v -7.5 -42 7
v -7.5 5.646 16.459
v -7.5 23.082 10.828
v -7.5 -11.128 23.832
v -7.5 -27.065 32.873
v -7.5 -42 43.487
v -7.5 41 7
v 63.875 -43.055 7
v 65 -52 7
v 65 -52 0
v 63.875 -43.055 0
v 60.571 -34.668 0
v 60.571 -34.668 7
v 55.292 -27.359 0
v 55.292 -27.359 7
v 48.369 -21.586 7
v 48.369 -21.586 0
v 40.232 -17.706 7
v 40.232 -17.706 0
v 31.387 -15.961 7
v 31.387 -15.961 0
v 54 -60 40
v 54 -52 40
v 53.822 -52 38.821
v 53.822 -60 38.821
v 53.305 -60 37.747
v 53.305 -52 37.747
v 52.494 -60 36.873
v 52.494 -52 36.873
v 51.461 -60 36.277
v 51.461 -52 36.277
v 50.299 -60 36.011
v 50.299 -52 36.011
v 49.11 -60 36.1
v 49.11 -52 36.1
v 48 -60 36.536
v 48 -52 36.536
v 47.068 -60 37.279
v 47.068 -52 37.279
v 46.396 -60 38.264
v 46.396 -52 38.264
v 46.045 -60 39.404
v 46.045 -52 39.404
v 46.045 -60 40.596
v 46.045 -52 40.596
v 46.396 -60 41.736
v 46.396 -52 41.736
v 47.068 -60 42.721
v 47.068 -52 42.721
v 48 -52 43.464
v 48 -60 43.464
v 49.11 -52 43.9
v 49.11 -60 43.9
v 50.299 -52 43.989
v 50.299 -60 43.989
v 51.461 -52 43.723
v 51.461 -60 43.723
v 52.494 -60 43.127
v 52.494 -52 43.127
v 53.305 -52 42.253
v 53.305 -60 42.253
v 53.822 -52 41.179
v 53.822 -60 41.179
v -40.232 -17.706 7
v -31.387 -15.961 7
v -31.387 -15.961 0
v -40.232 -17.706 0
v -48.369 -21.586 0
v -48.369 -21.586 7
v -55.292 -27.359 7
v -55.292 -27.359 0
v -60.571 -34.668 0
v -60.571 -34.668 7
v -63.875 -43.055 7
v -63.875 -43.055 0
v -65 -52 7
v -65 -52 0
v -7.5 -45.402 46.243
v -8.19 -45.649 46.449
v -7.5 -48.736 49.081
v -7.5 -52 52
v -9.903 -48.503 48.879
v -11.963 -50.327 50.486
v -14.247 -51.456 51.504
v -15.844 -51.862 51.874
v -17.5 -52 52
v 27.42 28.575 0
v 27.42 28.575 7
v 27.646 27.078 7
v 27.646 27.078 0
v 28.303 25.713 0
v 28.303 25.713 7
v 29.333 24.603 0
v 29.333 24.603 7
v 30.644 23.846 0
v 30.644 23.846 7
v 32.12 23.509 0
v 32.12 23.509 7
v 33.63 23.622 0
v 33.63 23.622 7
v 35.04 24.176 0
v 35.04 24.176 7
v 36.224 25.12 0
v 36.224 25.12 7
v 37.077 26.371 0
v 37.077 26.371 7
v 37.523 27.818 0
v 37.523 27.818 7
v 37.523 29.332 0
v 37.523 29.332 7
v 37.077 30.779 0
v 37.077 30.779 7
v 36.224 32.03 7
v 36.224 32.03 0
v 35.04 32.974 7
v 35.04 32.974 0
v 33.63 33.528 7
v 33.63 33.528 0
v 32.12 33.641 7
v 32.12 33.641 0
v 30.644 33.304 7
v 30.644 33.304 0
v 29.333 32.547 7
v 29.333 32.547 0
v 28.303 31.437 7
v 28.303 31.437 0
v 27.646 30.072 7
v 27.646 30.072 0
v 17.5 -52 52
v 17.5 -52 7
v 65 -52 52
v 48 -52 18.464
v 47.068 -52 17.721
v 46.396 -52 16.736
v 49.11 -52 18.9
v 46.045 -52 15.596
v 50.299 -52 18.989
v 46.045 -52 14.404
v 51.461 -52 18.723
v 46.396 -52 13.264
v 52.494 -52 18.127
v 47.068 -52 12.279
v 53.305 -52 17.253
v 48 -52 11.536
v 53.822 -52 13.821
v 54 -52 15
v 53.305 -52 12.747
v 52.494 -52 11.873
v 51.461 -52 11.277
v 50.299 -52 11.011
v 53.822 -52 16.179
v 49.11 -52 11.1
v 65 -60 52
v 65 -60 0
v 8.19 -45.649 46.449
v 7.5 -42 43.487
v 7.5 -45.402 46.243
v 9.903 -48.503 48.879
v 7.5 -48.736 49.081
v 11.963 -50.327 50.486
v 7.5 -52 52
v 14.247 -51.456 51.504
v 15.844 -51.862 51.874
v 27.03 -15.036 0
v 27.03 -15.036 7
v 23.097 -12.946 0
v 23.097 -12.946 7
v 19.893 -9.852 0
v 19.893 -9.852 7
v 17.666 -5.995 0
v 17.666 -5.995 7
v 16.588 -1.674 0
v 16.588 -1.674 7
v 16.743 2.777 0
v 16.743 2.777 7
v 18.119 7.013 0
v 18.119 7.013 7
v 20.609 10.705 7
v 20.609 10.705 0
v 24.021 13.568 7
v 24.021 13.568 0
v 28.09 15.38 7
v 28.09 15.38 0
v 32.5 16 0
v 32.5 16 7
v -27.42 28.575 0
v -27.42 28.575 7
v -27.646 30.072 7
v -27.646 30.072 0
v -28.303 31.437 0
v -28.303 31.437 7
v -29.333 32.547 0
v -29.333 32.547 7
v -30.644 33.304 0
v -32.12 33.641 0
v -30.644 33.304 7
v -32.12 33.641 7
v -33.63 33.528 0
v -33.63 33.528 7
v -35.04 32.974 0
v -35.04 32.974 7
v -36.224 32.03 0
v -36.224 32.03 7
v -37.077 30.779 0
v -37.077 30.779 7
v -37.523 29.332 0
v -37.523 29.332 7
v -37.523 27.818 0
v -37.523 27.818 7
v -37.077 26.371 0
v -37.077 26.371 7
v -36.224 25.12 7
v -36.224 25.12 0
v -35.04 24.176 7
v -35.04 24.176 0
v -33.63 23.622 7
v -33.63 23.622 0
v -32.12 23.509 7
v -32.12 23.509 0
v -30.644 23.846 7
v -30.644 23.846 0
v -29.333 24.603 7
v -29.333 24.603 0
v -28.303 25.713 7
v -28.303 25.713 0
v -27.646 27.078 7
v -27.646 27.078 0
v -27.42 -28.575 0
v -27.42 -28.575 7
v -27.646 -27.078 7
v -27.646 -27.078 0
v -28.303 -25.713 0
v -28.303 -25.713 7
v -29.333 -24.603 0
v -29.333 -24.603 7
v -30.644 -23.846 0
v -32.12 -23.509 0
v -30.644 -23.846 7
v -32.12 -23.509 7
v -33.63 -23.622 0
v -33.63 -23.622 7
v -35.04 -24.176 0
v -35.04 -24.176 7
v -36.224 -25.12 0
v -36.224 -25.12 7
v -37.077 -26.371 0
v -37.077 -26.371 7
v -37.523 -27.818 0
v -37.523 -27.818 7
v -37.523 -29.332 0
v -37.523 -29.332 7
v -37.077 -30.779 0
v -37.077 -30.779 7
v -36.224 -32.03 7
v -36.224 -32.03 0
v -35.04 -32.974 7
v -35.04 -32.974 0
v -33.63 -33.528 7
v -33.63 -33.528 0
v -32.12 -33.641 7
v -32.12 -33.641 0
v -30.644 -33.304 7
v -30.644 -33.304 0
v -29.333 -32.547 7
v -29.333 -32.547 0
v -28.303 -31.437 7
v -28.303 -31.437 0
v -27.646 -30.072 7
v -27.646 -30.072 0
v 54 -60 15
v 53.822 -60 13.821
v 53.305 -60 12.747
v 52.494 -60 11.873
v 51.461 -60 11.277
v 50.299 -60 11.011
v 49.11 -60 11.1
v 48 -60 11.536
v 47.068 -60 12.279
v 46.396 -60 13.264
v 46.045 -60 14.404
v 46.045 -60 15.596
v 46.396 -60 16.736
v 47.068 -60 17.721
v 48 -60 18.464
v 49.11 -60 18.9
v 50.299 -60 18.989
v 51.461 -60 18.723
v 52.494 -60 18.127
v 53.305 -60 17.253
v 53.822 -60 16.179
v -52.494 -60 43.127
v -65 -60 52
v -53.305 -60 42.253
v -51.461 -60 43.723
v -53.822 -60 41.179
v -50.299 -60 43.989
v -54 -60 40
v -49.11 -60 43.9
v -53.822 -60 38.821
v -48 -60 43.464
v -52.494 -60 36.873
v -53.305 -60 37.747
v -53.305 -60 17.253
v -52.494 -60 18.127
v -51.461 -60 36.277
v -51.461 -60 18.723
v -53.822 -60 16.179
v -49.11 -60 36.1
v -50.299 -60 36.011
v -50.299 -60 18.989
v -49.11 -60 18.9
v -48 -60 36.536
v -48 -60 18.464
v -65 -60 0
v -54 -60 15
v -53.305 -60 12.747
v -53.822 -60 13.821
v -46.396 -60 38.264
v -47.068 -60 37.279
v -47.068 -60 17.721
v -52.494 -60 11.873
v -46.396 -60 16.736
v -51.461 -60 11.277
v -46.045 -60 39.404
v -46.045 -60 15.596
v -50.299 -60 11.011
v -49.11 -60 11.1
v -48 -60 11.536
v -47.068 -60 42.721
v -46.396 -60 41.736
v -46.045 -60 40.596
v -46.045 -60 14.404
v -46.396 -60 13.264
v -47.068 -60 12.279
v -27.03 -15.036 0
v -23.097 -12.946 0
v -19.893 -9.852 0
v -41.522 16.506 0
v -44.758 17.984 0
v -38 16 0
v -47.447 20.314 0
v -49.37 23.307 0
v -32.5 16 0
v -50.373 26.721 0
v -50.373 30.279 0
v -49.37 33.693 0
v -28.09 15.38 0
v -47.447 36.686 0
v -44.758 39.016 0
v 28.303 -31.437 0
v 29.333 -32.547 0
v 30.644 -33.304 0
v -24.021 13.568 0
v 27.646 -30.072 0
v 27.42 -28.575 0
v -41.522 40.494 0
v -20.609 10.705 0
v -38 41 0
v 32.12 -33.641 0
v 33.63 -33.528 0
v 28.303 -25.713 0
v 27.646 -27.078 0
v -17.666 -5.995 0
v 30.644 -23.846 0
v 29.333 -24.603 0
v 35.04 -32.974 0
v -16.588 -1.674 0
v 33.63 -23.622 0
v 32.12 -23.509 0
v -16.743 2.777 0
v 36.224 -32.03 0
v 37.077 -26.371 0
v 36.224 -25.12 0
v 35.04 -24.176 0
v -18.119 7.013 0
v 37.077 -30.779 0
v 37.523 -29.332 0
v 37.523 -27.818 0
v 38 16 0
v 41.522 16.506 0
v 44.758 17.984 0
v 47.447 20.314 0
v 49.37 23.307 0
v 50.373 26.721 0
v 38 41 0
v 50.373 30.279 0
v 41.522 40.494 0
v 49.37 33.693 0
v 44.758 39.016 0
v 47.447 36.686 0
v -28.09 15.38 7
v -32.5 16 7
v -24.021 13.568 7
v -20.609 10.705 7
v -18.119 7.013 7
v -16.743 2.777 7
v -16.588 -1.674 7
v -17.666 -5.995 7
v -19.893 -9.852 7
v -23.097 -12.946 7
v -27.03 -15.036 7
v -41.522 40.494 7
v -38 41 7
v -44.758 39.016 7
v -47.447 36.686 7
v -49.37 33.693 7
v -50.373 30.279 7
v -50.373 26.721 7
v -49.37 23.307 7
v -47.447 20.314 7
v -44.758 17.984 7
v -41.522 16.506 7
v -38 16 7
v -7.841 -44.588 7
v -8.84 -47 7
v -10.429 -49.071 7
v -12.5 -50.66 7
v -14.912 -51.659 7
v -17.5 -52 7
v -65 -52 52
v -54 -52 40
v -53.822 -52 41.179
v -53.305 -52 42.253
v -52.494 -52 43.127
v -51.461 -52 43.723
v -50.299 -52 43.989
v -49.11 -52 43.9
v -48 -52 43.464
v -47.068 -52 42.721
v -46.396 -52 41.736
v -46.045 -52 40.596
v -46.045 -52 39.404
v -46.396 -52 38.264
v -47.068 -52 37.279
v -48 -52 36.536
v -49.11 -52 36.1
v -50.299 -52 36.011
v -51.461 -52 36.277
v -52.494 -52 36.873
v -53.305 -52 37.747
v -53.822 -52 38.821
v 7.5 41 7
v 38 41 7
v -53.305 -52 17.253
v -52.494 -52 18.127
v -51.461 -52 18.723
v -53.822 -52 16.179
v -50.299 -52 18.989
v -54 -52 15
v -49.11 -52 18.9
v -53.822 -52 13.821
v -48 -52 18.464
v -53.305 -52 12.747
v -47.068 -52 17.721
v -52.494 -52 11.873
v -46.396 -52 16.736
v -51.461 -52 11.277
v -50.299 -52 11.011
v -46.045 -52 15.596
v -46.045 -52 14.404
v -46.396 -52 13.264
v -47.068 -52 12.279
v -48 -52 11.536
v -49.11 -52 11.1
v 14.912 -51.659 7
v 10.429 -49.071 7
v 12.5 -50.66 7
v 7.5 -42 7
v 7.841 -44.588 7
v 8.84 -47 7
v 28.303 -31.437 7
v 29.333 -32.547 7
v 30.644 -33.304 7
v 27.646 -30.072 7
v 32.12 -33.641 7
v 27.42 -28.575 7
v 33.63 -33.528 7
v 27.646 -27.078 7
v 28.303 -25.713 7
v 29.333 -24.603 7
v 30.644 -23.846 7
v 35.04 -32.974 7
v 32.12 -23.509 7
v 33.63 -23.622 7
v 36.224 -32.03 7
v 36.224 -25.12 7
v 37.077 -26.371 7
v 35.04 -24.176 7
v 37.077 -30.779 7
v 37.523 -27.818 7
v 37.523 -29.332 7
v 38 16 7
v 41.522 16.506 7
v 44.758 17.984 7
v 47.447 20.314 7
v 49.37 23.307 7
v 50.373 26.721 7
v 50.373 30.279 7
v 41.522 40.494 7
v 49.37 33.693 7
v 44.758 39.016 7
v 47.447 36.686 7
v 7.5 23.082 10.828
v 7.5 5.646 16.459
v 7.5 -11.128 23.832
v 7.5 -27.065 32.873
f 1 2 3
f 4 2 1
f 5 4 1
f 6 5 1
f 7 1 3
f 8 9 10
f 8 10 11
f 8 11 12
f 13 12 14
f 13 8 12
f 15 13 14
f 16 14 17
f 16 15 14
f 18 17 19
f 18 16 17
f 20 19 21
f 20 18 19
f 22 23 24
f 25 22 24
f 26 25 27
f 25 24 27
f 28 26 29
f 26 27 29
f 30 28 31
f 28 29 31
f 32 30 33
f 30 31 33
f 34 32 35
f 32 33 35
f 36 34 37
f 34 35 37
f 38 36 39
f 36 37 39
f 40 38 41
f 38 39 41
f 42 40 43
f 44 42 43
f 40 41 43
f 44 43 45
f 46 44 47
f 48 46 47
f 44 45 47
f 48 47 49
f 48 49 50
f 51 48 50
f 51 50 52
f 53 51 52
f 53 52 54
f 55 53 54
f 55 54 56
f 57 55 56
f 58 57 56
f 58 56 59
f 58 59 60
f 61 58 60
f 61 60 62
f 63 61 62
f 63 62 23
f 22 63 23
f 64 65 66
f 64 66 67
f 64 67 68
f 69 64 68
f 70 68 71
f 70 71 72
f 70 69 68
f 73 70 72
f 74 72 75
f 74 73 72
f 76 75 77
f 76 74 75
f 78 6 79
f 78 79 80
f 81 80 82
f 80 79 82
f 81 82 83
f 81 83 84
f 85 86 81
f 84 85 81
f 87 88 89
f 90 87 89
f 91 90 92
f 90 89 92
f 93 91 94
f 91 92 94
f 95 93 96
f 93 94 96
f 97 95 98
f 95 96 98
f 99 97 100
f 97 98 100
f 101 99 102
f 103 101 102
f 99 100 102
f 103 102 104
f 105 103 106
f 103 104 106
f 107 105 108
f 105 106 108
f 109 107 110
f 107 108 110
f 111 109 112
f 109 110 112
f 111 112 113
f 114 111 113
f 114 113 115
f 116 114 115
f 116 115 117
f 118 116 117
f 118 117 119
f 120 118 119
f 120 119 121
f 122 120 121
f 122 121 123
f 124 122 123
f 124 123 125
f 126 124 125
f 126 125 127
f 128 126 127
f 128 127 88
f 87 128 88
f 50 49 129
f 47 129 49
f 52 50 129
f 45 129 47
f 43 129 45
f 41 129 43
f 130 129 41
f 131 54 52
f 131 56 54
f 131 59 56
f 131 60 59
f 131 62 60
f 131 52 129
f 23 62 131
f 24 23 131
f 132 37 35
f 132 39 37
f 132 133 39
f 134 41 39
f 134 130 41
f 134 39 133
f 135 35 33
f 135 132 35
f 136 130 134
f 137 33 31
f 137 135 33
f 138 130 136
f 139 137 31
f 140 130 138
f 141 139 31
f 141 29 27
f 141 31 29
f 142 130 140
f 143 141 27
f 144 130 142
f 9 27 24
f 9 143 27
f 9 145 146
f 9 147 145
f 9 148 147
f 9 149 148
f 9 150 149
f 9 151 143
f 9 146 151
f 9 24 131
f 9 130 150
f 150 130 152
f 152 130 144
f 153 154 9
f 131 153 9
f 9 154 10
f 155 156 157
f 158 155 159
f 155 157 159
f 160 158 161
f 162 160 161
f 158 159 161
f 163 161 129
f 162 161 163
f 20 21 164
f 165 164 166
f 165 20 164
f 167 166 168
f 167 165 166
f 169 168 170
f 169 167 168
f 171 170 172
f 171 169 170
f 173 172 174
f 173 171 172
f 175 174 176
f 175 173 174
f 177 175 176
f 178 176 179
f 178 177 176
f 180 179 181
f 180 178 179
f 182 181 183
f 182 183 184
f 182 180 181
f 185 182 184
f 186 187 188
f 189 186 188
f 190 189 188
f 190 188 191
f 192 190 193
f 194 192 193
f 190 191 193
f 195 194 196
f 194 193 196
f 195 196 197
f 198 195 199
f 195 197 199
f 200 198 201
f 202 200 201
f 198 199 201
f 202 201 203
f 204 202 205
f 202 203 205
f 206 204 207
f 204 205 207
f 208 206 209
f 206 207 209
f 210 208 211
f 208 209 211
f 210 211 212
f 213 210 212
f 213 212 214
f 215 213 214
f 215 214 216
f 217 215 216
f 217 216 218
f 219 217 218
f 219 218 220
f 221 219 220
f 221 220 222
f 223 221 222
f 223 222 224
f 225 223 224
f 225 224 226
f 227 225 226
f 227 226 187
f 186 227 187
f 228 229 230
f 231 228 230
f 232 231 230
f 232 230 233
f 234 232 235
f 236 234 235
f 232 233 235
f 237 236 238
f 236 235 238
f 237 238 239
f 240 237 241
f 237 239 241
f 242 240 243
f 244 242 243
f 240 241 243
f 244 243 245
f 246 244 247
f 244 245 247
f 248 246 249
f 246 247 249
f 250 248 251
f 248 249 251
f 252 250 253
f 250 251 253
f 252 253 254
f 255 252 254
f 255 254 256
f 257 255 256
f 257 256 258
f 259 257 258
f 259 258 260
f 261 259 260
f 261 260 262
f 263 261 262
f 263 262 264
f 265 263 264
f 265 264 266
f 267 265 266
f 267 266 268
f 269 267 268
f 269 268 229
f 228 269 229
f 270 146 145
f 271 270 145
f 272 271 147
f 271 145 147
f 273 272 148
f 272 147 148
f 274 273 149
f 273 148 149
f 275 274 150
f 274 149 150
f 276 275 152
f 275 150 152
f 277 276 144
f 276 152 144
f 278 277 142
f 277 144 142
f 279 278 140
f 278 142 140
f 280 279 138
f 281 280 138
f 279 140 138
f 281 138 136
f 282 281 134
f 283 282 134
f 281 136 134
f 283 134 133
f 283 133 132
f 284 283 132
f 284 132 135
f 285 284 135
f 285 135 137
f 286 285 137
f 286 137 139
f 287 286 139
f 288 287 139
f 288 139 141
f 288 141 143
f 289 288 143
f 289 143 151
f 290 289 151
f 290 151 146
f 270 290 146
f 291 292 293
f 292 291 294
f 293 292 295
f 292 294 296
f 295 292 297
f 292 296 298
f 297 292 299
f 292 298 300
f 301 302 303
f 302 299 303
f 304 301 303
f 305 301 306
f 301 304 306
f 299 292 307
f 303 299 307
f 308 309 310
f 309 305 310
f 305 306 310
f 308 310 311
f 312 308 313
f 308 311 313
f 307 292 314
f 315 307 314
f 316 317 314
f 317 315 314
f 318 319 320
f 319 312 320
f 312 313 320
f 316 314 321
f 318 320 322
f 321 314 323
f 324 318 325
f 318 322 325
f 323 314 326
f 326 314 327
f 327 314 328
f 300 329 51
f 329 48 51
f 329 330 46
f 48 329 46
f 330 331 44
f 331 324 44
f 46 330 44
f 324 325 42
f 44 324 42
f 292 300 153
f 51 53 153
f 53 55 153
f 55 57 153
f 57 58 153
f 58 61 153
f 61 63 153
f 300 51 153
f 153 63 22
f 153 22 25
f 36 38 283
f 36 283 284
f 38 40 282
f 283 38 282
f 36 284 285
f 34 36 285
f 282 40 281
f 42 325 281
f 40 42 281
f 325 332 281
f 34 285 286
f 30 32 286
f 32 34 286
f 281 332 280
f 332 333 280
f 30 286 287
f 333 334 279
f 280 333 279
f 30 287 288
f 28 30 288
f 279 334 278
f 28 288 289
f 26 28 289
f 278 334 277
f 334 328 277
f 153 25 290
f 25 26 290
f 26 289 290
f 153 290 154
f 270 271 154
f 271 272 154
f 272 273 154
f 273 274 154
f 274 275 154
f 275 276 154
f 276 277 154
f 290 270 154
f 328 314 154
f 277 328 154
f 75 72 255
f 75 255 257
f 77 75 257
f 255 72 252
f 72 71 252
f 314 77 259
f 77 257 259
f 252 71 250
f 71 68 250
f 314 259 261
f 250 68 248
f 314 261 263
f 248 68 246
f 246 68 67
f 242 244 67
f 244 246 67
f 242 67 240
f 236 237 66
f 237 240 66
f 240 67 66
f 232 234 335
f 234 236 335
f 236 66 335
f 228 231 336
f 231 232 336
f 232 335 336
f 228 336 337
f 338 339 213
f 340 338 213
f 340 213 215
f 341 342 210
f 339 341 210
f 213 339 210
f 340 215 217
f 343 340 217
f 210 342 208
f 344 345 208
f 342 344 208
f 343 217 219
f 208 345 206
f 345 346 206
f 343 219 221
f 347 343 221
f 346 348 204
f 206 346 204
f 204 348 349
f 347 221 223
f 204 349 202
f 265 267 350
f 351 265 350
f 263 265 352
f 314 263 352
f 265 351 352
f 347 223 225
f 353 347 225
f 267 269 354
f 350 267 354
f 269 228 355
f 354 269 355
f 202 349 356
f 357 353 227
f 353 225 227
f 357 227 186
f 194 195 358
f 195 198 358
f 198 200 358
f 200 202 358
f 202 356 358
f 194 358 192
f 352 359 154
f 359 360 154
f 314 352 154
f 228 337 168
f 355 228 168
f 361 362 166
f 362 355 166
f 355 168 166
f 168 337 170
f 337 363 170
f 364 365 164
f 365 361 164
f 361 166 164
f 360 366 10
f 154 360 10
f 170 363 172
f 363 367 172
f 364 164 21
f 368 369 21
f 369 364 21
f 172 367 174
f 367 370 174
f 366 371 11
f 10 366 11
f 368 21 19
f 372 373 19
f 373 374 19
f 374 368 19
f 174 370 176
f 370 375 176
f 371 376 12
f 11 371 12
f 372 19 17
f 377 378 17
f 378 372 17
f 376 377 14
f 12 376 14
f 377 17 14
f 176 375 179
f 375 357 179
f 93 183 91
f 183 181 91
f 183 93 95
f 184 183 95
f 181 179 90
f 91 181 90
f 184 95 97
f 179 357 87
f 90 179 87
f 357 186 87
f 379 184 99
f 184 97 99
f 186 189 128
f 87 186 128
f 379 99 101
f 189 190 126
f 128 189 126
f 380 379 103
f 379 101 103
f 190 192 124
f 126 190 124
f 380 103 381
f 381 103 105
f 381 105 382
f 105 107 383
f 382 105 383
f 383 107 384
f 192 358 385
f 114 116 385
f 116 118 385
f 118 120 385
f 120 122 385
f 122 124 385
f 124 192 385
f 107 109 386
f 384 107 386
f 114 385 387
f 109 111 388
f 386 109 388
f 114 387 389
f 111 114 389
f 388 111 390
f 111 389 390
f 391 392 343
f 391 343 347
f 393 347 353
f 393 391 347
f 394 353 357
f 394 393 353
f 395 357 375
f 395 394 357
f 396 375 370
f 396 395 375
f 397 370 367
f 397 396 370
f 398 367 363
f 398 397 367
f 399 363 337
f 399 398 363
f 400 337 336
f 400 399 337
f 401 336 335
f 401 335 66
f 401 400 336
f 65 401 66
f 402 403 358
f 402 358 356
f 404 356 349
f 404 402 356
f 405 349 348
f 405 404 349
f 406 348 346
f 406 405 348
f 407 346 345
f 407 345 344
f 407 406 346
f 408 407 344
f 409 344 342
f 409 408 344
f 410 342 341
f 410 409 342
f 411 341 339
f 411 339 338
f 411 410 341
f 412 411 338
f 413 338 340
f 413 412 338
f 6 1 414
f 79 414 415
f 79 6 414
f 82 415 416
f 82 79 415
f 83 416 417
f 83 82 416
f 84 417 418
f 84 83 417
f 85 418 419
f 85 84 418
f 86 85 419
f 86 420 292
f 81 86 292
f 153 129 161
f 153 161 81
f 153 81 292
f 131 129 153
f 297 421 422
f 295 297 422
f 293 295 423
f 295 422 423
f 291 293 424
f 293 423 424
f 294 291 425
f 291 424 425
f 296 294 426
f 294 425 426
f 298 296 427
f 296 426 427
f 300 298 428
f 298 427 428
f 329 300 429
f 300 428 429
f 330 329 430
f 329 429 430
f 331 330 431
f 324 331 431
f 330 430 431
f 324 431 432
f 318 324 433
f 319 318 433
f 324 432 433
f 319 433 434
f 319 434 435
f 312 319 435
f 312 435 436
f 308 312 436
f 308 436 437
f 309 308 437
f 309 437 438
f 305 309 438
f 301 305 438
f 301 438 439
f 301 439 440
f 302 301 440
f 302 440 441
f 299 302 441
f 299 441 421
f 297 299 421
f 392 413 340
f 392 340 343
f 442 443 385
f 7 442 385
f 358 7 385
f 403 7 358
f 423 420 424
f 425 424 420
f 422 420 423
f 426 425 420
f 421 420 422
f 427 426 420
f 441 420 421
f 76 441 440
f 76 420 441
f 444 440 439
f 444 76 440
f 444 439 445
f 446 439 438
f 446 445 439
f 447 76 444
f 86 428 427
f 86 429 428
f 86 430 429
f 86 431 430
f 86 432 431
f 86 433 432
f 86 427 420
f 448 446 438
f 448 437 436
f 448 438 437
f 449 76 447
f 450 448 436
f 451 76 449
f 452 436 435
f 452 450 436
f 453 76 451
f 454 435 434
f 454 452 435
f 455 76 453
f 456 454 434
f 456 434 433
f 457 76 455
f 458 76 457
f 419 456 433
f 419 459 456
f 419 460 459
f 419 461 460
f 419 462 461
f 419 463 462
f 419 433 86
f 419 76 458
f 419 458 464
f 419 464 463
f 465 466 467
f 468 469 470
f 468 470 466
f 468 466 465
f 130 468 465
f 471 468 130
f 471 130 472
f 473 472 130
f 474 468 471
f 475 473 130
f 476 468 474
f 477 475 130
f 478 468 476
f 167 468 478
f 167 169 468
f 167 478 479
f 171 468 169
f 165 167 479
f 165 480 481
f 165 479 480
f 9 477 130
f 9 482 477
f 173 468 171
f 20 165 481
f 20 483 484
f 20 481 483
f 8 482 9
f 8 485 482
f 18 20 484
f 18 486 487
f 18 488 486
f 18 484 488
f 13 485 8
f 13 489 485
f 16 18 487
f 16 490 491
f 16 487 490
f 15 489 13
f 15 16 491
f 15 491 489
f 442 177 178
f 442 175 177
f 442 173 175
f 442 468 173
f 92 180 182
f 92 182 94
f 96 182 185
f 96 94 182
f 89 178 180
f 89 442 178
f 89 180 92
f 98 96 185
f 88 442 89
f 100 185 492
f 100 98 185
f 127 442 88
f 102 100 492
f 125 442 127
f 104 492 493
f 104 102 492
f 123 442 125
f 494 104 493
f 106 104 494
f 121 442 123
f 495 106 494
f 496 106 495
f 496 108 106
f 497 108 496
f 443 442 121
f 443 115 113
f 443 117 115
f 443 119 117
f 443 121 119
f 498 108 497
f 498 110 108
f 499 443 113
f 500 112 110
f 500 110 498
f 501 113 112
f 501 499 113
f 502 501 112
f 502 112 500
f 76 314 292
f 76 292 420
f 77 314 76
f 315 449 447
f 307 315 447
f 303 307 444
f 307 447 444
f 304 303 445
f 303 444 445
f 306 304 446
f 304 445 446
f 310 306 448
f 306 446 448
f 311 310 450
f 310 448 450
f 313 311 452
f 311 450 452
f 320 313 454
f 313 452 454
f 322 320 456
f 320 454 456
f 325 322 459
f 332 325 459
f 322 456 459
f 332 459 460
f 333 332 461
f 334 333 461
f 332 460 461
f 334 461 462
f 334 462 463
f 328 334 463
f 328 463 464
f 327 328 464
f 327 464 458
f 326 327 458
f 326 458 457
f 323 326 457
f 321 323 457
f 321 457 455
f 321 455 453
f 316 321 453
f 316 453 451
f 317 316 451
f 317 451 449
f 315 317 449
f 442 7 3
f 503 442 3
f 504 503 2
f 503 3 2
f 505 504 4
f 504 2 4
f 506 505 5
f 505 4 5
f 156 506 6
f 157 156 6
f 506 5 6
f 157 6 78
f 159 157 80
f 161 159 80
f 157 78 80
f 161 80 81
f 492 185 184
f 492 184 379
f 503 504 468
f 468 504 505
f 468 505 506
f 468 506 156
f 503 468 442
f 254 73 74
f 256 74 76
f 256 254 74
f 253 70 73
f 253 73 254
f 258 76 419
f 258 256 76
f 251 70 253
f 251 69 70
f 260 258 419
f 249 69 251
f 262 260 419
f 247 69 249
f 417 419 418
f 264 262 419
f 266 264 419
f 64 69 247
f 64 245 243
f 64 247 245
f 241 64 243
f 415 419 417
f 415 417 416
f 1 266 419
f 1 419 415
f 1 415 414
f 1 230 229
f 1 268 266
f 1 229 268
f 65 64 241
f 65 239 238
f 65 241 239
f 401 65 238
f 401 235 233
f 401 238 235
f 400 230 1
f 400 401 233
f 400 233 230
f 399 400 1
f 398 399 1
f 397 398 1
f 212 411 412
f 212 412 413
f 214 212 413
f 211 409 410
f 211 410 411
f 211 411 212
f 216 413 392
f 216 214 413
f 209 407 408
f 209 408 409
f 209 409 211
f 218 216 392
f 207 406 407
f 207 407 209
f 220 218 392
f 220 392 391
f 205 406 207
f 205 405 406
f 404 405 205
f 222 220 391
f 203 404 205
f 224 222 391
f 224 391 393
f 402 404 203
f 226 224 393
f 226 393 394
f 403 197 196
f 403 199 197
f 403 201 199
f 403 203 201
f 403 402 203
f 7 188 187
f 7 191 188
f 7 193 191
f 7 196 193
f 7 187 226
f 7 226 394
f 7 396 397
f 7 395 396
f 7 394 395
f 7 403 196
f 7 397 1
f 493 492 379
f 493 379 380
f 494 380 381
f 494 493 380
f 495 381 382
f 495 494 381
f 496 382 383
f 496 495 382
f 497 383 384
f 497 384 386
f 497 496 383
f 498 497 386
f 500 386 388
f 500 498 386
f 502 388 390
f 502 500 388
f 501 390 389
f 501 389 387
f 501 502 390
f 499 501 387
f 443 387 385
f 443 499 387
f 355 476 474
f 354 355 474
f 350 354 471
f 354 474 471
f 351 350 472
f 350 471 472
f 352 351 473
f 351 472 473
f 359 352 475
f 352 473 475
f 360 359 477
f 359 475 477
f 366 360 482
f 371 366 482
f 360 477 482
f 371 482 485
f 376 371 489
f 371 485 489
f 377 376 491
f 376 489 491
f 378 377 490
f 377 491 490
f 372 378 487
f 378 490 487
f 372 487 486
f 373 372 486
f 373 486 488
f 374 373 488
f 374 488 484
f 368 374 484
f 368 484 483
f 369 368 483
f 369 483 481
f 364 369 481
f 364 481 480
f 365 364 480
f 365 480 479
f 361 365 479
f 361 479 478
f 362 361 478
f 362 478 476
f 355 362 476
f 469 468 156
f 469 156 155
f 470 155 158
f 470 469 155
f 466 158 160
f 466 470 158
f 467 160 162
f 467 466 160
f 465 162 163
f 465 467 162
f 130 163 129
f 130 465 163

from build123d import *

# Parameters (mm, degrees)
SKETCH1_W               = 130
SKETCH1_H               = 120
BOSS_EXTRUDE1_DEPTH     = 7
SKETCH2_R               = 13.462
SKETCH2_R_2             = 5.08
CUT_EXTRUDE1_DEPTH      = 89.735562206
SKETCH4_W               = 130
SKETCH4_H               = 8
BOSS_EXTRUDE2_DEPTH     = 45
CUT_EXTRUDE4_START      = -10
SKETCH10_R              = 13.462
CUT_EXTRUDE4_DEPTH      = 10
SKETCH11_R              = 4
CUT_EXTRUDE5_DEPTH      = 125.811858411
RIB1_REACH              = 104.611
SKETCH9_WALL_W          = 310.536883344
SKETCH9_WALL_H          = 15
CUT_EXTRUDE6_DEPTH      = 108.518603042
CUT_EXTRUDE6_DEPTH_BACK = 108.518603042
FILLET1_R               = 10


with BuildPart() as part:
    # Sketch1 → Boss-Extrude1 (new body)
    with BuildSketch(Plane.XY):
        Rectangle(SKETCH1_W, SKETCH1_H)
    extrude(amount=BOSS_EXTRUDE1_DEPTH)

    # Sketch2 → Cut-Extrude1 (cut, through all)
    with BuildSketch(Plane.XY.offset(7)):
        with Locations((-32.5, 0)):
            Circle(SKETCH2_R)
        with Locations((-32.5, 28.575)):
            Circle(SKETCH2_R_2)
        with Locations((-32.5, -28.575)):
            Circle(SKETCH2_R_2)
        with Locations(Location((32.5, -28.575, 0), (0, 0, 180))):
            Circle(SKETCH2_R_2)
        with Locations(Location((32.5, 0, 0), (0, 0, 180))):
            Circle(SKETCH2_R)
        with Locations(Location((32.5, 28.575, 0), (0, 0, 180))):
            Circle(SKETCH2_R_2)
    extrude(amount=-CUT_EXTRUDE1_DEPTH, mode=Mode.SUBTRACT)

    # Sketch4 → Boss-Extrude2 (add)
    with BuildSketch(Plane.XY.offset(7)):
        with Locations((0, -56)):
            Rectangle(SKETCH4_W, SKETCH4_H)
    extrude(amount=BOSS_EXTRUDE2_DEPTH)

    # Sketch10 → Cut-Extrude4 (cut)
    with BuildSketch(Plane(origin=(0, 0, 0), x_dir=(-1, 0, 0), z_dir=(0, 0, -1)).offset(CUT_EXTRUDE4_START)):
        with BuildLine():
            ThreePointArc((31.386922126, -15.961236094), (55.292470874, -27.359426204), (65, -52))
            Line((65, -52), (65, 60))
            Line((65, 60), (-65, 60))
            Line((-65, 60), (-65, -52))
            ThreePointArc((-65, -52), (-55.292470874, -27.359426204), (-31.386922126, -15.961236094))
            ThreePointArc((-31.386922126, -15.961236094), (-16.509693913, 0.556876331), (-32.5, 16))
            Line((-32.5, 16), (-38, 16))
            ThreePointArc((-38, 16), (-50.5, 28.5), (-38, 41))
            Line((-38, 41), (38, 41))
            ThreePointArc((38, 41), (50.5, 28.5), (38, 16))
            Line((38, 16), (32.5, 16))
            ThreePointArc((32.5, 16), (16.509693913, 0.556876331), (31.386922126, -15.961236094))
        make_face()
        with Locations((-32.5, 0)):
            Circle(SKETCH10_R, mode=Mode.SUBTRACT)
        with Locations((32.5, 0)):
            Circle(SKETCH10_R, mode=Mode.SUBTRACT)
    extrude(amount=CUT_EXTRUDE4_DEPTH, mode=Mode.SUBTRACT)

    # Sketch11 → Cut-Extrude5 (cut, through all)
    with BuildSketch(Plane(origin=(0, -52, 0), x_dir=(1, 0, 0), z_dir=(0, 1, 0))):
        with Locations(Location((-50, -15, 0), (0, 0, 180))):
            Circle(SKETCH11_R)
        with Locations(Location((-50, -40, 0), (0, 0, 180))):
            Circle(SKETCH11_R)
        with Locations((50, -40)):
            Circle(SKETCH11_R)
        with Locations((50, -15)):
            Circle(SKETCH11_R)
    extrude(amount=-CUT_EXTRUDE5_DEPTH, mode=Mode.SUBTRACT)

    # Sketch9 wall → Rib1 (add, up to next)
    with BuildSketch(Plane(origin=(0, -5.5, 29.5), x_dir=(0, -0.900159251416, 0.435560928104), z_dir=(0, -0.435560928104, -0.900159251416)), mode=Mode.PRIVATE) as rib1_sk1:
        Rectangle(SKETCH9_WALL_W, SKETCH9_WALL_H)
    rib1_tool1 = extrude(rib1_sk1.sketch, amount=RIB1_REACH, mode=Mode.PRIVATE) - part.part
    add(rib1_tool1.solids().sort_by_distance((0, -5.5, 29.5))[0])

    # Sketch13 → Cut-Extrude6 (cut, two sides: drawn at the far end of the back side and taken through both)
    with BuildSketch(Plane(origin=(7.5, 0, 0), x_dir=(0, 0, -1), z_dir=(1, 0, 0)).offset(-CUT_EXTRUDE6_DEPTH_BACK)):
        with BuildLine():
            ThreePointArc((-7, 41), (-22.684215539, -8.797960223), (-52, -52))
            Line((-52, -52), (-7, 41))
        make_face()
    extrude(amount=CUT_EXTRUDE6_DEPTH + CUT_EXTRUDE6_DEPTH_BACK, mode=Mode.SUBTRACT)

    # Fillet1
    # the kernel refuses this fillet: 10 mm, written as the material it adds along each edge
    with BuildSketch(Plane(origin=(7.5, -52, 7), x_dir=(1, 0, 0), z_dir=(0, 0, 1))) as fillet1_piece_1_section:
        with BuildLine():
            CenterArc((FILLET1_R, FILLET1_R), FILLET1_R, 180, 90)
            Line((0, FILLET1_R), (0, 0))
            Line((0, 0), (FILLET1_R, 0))
        make_face()
    fillet1_piece_1 = extrude(amount=45, mode=Mode.PRIVATE)
    fillet1_piece_1 = fillet1_piece_1 - Plane(origin=(9.819534596, 69.603006836, 184.712880794), x_dir=(0, -0.15890559353119482, -0.9872937821866897), z_dir=(-1, 0, 0)) * Cylinder(180, 130, mode=Mode.PRIVATE)
    add(fillet1_piece_1)
    with BuildSketch(Plane(origin=(-7.5, -52, 52), x_dir=(-1, 0, 0), z_dir=(0, 0, -1))) as fillet1_piece_2_section:
        with BuildLine():
            CenterArc((FILLET1_R, FILLET1_R), FILLET1_R, 180, 90)
            Line((0, FILLET1_R), (0, 0))
            Line((0, 0), (FILLET1_R, 0))
        make_face()
    fillet1_piece_2 = extrude(amount=45, mode=Mode.PRIVATE)
    fillet1_piece_2 = fillet1_piece_2 - Plane(origin=(-9.819536327, 69.603006836, 184.712880794), x_dir=(0, -0.15890559353119482, -0.9872937821866897), z_dir=(-1, 0, 0)) * Cylinder(180, 130, mode=Mode.PRIVATE)
    add(fillet1_piece_2)


solid = part.part
